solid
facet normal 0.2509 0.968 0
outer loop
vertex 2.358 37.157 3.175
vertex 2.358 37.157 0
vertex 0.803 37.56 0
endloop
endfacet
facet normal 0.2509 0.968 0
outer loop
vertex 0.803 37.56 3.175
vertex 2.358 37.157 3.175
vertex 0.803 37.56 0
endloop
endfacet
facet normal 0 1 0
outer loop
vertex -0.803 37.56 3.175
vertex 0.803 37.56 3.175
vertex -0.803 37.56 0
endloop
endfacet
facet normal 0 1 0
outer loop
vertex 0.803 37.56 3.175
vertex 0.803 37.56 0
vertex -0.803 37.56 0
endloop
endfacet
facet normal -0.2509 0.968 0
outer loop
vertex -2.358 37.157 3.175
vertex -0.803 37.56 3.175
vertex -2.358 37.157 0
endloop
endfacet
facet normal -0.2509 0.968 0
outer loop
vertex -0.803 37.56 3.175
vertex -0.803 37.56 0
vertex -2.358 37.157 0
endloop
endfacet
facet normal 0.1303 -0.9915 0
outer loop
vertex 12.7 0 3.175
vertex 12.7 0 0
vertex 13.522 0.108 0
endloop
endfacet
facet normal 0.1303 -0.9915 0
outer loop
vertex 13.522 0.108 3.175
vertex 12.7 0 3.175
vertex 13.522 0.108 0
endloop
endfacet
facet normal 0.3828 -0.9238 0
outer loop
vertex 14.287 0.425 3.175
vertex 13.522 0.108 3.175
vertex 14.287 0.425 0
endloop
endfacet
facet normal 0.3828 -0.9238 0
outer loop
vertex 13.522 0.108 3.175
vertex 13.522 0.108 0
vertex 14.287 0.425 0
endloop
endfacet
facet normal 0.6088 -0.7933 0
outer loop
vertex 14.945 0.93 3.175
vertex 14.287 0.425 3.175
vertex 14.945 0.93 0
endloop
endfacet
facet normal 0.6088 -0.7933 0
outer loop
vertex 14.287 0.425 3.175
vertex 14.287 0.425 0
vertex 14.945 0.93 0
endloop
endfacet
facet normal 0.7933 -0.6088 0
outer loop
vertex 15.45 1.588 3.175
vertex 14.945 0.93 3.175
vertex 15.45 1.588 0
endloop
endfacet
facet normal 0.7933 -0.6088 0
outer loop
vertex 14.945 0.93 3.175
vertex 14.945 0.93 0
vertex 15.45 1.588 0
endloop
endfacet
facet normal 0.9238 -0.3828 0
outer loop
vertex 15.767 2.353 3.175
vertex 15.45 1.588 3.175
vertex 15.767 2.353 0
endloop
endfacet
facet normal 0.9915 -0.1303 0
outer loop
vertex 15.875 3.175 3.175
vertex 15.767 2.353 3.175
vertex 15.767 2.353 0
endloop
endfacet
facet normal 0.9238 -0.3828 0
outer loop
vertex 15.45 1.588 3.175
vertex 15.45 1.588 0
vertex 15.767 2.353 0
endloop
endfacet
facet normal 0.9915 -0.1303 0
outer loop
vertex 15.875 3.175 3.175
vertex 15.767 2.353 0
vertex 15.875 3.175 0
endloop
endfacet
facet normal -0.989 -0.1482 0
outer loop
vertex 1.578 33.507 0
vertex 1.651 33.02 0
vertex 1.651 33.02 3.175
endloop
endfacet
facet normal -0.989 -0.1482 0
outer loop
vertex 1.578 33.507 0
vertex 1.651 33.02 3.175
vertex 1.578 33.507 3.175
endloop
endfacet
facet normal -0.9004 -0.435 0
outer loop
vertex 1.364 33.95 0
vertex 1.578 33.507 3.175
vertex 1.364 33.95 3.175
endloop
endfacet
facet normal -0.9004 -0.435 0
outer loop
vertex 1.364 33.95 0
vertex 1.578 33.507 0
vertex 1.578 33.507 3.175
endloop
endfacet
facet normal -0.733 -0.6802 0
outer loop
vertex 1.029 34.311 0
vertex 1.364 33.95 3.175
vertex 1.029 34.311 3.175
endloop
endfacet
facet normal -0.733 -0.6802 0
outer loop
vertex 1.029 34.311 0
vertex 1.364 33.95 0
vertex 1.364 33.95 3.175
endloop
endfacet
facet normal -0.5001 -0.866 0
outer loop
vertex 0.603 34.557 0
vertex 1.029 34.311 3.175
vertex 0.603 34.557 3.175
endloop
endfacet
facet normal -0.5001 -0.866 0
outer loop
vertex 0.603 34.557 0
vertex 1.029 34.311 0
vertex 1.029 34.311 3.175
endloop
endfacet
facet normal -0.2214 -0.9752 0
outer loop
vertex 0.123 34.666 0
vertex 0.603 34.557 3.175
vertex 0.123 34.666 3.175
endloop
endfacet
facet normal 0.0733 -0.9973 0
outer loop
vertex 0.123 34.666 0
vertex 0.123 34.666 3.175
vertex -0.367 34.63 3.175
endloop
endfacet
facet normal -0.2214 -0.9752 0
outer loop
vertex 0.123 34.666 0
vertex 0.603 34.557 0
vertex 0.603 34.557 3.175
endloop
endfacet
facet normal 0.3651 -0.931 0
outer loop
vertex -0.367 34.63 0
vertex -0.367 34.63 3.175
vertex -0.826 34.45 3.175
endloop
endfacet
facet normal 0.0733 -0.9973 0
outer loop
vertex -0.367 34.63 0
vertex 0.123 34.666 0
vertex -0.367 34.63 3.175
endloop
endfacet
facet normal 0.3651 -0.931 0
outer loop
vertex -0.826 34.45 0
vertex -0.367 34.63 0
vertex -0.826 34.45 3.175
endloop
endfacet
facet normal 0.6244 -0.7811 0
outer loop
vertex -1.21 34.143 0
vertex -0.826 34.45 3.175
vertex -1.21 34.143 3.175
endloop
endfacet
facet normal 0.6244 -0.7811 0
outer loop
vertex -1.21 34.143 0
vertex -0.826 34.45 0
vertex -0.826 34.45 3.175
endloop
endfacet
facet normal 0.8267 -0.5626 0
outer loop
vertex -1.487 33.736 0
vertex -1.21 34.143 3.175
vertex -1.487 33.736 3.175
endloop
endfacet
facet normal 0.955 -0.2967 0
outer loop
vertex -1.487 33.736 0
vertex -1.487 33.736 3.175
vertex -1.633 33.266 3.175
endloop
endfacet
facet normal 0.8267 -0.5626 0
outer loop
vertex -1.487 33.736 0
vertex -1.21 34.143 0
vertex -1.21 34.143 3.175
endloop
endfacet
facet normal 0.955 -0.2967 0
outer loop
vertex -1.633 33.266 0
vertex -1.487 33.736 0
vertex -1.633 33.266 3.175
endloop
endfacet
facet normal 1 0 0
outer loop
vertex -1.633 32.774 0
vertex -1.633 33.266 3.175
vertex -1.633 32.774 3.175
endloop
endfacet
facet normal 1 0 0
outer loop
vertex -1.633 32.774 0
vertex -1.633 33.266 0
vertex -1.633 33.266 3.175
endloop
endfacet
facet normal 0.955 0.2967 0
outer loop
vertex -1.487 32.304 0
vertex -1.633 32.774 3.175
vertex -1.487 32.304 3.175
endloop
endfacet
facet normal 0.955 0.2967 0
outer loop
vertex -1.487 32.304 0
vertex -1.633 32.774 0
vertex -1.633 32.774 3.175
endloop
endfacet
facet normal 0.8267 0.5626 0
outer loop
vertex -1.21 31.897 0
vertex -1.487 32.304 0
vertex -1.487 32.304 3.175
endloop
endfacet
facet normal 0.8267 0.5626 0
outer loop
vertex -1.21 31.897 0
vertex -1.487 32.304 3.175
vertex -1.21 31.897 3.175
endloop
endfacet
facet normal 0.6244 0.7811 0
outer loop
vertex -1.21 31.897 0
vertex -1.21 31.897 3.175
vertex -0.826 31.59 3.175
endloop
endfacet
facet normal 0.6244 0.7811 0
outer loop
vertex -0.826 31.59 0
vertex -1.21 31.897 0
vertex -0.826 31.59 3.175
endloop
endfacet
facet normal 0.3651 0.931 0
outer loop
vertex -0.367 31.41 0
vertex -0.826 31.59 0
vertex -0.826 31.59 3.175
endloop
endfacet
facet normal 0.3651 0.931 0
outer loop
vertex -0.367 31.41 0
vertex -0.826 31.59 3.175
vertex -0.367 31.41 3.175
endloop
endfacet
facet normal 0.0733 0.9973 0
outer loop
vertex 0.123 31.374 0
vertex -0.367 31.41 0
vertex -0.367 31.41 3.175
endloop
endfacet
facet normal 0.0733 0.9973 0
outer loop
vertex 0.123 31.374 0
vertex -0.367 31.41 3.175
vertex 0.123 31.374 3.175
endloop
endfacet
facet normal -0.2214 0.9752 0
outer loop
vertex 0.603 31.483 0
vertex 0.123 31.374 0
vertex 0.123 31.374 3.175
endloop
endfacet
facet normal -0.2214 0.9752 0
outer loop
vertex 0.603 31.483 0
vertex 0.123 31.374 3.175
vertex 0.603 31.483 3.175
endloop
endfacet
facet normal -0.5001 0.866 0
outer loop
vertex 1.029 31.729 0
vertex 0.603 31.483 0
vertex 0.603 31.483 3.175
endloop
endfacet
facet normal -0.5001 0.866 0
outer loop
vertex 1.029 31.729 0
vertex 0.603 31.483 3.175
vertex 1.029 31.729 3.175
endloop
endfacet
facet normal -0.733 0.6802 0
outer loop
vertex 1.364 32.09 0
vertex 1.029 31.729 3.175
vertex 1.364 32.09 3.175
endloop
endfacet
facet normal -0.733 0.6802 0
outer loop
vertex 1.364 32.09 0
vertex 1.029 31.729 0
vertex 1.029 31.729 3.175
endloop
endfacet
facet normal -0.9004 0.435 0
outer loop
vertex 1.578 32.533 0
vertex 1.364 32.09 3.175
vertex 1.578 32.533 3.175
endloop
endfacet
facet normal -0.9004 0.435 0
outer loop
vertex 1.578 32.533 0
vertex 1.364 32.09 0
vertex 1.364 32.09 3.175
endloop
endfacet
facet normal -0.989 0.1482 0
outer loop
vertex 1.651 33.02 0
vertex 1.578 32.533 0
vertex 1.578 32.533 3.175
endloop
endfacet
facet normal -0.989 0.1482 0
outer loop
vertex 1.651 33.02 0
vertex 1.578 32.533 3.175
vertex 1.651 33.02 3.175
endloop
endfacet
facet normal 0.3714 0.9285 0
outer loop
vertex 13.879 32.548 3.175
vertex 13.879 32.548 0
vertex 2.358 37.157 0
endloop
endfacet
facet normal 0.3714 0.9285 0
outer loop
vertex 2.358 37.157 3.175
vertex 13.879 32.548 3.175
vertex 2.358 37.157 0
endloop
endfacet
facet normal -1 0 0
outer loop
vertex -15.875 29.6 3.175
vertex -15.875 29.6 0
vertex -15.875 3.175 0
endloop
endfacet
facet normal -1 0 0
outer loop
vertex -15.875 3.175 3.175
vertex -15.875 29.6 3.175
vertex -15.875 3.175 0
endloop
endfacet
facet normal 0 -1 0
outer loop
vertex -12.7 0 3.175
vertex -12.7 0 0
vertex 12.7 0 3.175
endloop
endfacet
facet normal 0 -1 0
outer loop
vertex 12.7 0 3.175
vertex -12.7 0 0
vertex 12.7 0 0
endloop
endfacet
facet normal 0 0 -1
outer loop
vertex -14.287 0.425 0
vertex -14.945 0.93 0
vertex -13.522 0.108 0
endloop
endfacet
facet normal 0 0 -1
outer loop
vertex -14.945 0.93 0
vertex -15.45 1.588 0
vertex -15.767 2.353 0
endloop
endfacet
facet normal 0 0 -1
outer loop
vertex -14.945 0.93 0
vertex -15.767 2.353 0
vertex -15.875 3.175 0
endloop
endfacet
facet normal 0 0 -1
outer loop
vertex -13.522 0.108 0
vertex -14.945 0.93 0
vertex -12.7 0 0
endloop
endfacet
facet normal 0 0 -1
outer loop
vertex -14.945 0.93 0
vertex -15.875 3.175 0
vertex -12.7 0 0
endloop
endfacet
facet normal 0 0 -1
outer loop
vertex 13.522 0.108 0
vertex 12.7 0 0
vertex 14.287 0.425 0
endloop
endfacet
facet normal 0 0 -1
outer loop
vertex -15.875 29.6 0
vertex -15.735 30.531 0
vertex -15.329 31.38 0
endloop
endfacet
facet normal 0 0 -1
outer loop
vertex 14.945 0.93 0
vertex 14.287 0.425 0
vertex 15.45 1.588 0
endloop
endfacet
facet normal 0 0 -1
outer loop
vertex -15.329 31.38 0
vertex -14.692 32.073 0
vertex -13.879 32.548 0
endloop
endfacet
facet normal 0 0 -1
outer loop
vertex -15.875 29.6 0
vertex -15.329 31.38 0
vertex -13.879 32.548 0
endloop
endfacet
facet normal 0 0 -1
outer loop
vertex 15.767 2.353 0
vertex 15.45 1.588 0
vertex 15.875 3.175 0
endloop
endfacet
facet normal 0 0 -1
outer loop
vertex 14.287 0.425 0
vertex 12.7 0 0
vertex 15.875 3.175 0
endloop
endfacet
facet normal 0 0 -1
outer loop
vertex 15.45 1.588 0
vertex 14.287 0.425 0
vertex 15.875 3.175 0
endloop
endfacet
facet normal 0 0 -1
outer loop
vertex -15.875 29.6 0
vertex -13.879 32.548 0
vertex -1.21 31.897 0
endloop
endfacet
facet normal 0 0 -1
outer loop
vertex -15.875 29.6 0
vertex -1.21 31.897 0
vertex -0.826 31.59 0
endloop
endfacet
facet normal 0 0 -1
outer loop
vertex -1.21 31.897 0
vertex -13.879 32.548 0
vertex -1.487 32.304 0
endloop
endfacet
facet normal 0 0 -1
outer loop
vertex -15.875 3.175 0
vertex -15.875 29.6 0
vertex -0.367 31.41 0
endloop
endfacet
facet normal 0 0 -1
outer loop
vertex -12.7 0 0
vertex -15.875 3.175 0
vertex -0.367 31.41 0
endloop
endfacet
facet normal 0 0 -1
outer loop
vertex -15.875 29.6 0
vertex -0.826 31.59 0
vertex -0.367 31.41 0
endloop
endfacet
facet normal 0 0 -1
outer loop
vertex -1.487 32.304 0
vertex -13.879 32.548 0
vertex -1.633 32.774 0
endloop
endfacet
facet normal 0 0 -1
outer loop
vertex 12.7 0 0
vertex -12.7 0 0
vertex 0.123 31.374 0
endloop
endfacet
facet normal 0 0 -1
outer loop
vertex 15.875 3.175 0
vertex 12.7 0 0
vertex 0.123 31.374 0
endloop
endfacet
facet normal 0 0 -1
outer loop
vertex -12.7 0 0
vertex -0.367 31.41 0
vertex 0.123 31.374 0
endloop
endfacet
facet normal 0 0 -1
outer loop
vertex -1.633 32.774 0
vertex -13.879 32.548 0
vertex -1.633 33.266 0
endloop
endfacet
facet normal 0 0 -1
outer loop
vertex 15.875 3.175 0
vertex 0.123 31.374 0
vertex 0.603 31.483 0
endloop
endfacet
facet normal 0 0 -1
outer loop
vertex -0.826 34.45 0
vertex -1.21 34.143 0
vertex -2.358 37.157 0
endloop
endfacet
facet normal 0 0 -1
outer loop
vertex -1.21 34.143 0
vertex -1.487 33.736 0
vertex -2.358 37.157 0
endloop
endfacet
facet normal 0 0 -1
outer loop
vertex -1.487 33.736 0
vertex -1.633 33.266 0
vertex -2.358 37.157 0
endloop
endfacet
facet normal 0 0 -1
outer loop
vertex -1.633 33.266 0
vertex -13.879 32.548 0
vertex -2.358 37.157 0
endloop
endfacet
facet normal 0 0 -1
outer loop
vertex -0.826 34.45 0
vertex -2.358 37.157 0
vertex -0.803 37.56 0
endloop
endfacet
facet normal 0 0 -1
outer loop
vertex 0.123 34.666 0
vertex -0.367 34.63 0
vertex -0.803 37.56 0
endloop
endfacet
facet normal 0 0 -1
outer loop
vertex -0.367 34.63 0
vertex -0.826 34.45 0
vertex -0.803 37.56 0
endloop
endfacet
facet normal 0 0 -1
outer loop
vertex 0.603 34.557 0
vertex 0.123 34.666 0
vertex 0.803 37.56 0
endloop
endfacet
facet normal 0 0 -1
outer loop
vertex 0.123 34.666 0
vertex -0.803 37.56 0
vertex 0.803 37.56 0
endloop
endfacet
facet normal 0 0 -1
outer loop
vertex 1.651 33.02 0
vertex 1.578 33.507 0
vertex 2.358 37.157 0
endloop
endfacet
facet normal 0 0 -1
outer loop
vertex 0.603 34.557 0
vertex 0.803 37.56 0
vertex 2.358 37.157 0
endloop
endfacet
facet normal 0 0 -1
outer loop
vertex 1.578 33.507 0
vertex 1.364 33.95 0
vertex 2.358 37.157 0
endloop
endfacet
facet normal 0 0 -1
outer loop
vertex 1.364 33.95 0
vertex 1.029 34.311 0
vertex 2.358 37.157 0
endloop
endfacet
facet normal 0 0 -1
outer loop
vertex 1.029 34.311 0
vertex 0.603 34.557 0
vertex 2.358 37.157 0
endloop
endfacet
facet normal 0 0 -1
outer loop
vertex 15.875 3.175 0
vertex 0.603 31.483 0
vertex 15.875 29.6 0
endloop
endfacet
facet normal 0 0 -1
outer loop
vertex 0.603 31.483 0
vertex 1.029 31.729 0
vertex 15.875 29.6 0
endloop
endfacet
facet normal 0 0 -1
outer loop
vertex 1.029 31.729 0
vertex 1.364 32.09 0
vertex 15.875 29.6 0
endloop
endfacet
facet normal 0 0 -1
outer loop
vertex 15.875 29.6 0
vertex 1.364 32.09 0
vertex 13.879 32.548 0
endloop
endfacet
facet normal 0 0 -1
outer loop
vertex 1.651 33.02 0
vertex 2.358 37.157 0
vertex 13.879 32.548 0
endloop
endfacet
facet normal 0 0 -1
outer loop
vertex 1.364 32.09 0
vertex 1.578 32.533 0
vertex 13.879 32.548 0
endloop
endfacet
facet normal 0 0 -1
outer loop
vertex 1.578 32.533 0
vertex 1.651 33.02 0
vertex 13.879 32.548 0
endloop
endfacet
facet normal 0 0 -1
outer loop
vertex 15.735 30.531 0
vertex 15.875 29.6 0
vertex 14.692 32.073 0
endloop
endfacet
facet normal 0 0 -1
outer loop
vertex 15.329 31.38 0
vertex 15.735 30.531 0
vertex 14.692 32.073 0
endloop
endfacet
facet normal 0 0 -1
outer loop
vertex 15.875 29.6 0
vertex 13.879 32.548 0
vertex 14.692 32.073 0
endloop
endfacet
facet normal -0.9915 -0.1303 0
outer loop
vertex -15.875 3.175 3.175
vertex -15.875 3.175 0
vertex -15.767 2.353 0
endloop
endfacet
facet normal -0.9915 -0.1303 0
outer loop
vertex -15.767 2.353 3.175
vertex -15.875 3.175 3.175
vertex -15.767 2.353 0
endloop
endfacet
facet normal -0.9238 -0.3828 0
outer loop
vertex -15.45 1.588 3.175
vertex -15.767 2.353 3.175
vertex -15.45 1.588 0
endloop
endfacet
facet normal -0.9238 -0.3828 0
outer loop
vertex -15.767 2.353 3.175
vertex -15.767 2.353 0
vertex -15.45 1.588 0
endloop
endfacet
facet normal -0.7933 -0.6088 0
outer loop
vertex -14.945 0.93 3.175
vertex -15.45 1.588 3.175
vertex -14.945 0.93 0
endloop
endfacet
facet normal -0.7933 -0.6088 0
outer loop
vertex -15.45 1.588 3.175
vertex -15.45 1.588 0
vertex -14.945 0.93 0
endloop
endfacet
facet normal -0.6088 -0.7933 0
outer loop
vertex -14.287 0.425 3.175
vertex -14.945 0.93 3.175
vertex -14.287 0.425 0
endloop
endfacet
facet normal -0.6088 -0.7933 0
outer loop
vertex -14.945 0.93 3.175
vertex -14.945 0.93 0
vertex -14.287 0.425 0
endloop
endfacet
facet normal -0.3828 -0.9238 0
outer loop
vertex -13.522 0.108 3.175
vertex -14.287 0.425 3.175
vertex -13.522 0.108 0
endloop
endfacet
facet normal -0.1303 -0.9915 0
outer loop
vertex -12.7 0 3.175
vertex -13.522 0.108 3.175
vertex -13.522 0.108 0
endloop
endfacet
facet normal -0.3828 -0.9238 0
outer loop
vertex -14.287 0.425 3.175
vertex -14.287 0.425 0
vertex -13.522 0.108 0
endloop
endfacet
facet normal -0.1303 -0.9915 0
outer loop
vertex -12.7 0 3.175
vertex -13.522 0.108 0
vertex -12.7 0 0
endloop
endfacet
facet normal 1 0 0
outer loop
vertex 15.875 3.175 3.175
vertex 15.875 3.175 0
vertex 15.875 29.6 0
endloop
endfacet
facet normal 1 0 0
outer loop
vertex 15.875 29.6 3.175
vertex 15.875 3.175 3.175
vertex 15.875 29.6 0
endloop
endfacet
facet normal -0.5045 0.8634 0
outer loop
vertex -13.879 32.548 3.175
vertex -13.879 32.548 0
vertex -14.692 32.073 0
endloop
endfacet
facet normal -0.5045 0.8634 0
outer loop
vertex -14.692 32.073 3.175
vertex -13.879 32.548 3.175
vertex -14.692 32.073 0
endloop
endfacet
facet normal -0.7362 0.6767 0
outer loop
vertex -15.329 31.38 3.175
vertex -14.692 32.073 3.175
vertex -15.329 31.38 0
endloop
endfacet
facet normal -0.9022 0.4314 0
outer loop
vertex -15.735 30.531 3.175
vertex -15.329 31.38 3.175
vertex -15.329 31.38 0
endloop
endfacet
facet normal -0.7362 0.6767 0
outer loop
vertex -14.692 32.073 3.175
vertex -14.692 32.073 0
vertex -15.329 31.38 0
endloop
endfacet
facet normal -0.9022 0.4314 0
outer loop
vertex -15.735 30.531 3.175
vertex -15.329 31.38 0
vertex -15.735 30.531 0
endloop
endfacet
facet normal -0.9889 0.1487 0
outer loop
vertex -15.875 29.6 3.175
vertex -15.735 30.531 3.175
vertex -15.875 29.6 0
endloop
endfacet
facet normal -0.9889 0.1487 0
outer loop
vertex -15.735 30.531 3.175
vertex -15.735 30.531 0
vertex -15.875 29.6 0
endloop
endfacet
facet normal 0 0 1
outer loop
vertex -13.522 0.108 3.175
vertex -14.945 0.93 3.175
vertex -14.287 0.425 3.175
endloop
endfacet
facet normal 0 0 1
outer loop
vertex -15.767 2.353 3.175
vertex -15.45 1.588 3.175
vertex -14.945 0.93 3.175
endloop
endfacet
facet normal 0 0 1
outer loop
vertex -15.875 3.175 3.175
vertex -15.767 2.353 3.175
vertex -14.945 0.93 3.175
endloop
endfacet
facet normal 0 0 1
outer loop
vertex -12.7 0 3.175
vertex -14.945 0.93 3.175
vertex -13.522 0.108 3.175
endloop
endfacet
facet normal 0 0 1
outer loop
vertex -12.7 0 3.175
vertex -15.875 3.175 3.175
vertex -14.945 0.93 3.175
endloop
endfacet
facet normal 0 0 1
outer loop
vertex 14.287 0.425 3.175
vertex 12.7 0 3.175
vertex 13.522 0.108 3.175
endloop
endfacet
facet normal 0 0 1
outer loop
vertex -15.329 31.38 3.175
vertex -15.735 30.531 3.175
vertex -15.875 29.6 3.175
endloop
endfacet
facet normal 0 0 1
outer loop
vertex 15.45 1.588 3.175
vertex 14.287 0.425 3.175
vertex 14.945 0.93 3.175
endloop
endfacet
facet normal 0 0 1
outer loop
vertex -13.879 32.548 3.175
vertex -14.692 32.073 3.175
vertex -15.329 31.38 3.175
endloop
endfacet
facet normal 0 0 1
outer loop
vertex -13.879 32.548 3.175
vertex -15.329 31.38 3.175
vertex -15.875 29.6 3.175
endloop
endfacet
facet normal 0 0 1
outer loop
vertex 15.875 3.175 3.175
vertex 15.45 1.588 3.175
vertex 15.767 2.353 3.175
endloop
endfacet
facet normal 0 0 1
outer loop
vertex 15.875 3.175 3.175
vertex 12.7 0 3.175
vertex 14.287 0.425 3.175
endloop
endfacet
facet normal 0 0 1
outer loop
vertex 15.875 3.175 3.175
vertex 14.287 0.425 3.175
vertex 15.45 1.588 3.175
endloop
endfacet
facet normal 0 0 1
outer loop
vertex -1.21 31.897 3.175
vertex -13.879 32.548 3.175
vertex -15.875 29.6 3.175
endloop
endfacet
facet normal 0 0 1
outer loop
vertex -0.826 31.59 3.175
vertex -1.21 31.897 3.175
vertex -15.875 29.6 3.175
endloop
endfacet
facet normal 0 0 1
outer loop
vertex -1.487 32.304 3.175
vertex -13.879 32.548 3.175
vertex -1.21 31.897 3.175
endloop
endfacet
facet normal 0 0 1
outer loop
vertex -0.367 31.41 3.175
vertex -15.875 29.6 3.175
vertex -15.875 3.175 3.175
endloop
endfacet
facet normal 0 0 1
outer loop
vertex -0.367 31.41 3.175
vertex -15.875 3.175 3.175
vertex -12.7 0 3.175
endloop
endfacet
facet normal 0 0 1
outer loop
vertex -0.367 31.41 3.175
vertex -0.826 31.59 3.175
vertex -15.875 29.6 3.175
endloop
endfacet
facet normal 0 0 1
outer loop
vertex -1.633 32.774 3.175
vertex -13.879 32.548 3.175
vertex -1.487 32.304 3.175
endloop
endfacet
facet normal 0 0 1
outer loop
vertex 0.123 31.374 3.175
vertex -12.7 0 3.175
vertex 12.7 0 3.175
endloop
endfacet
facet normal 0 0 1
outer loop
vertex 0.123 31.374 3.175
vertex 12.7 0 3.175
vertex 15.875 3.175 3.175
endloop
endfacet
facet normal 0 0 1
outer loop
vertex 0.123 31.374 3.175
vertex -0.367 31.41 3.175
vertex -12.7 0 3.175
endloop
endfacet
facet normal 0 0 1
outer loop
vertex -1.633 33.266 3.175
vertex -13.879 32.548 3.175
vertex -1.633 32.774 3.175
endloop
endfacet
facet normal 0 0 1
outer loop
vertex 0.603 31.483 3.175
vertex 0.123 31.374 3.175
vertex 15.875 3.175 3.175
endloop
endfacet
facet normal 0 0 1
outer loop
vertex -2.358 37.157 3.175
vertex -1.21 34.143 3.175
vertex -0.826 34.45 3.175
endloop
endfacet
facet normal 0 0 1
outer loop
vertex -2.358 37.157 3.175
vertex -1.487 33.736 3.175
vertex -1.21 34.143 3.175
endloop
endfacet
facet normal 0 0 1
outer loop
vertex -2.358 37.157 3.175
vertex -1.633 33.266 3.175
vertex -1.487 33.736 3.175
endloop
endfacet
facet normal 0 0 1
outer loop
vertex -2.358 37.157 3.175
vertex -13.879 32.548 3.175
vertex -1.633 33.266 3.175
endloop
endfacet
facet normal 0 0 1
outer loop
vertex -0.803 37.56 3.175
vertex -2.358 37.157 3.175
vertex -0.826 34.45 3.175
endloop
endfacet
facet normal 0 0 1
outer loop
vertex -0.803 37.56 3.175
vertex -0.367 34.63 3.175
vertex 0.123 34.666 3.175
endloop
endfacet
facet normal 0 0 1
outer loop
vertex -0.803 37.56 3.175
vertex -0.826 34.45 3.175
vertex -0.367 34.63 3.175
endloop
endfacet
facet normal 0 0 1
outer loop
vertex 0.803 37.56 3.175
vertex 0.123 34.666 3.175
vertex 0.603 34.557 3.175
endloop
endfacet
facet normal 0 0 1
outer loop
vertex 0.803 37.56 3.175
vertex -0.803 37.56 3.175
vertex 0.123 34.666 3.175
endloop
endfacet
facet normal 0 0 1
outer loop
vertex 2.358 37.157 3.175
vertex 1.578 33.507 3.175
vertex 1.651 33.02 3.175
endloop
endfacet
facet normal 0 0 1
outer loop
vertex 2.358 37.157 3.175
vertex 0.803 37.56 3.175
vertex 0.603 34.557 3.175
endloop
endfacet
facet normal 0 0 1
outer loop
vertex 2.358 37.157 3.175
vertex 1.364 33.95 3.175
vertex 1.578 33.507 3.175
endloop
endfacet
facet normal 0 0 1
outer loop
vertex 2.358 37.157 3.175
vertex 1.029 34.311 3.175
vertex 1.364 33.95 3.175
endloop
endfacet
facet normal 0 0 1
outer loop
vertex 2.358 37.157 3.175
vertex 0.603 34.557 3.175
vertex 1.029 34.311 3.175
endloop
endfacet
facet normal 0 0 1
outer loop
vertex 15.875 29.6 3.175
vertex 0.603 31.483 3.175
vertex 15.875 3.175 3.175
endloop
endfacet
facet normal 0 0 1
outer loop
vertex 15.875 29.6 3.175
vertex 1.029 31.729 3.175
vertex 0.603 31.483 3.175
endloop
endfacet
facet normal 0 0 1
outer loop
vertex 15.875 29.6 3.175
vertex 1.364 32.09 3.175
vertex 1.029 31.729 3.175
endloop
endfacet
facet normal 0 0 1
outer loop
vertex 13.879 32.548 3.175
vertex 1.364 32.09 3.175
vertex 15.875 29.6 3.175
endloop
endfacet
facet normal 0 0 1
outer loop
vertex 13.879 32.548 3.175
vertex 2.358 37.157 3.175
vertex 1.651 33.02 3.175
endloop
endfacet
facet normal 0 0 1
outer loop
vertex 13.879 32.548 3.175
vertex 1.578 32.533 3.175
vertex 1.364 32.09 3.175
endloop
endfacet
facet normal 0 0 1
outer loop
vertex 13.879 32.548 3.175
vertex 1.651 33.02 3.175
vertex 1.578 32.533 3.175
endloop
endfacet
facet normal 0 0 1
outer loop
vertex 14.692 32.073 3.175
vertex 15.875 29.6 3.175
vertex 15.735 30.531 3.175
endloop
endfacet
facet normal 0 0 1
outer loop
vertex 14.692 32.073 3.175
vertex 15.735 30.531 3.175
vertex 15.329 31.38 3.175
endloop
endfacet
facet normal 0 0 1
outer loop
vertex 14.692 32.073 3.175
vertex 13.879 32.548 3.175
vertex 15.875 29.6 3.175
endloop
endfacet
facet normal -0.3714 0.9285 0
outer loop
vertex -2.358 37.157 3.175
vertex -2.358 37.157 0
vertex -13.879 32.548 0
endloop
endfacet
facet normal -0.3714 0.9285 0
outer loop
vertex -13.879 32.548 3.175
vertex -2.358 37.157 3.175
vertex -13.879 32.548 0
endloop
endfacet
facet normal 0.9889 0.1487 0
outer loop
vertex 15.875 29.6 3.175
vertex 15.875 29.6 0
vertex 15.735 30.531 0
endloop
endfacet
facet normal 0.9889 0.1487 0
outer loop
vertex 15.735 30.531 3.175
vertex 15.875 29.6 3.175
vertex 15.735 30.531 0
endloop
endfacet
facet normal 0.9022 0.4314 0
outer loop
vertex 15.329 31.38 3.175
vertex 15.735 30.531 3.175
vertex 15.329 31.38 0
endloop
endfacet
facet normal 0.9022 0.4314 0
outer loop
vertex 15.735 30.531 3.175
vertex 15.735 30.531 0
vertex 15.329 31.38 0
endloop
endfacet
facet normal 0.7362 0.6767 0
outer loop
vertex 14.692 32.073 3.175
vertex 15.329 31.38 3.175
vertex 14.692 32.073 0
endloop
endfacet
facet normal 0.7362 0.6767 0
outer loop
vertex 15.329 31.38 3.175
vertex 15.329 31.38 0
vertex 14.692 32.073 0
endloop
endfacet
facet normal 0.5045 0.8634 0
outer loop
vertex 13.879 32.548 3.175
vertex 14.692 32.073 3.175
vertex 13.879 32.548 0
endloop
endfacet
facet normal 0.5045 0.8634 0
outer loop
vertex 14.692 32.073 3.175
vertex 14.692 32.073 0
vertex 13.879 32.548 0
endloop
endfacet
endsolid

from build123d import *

# Parameters (mm, degrees)
F0_R     = 1.651
F1_DEPTH = 3.175


with BuildPart() as f1:
    # F0 (on Top) → F1 (new body)
    with BuildSketch(Plane.XY):
        with BuildLine():
            ThreePointArc((-15.875, 3.175), (-14.945064, 0.929936), (-12.7, 0))
            Line((-12.7, 0), (12.7, 0))
            ThreePointArc((12.7, 0), (14.945064, 0.929936), (15.875, 3.175))
            Line((15.875, 3.175), (15.875, 29.60042))
            ThreePointArc((15.875, 29.60042), (15.329113, 31.380417), (13.879165, 32.548334))
            Line((13.879165, 32.548334), (2.358331, 37.156668))
            ThreePointArc((2.358331, 37.156668), (0, 37.610841), (-2.358331, 37.156668))
            Line((-2.358331, 37.156668), (-13.879165, 32.548334))
            ThreePointArc((-13.879165, 32.548334), (-15.329113, 31.380417), (-15.875, 29.60042))
            Line((-15.875, 29.60042), (-15.875, 3.175))
        make_face()
        with Locations((0, 33.02)):
            Circle(F0_R, mode=Mode.SUBTRACT)
    extrude(amount=F1_DEPTH)


solid = f1.part
